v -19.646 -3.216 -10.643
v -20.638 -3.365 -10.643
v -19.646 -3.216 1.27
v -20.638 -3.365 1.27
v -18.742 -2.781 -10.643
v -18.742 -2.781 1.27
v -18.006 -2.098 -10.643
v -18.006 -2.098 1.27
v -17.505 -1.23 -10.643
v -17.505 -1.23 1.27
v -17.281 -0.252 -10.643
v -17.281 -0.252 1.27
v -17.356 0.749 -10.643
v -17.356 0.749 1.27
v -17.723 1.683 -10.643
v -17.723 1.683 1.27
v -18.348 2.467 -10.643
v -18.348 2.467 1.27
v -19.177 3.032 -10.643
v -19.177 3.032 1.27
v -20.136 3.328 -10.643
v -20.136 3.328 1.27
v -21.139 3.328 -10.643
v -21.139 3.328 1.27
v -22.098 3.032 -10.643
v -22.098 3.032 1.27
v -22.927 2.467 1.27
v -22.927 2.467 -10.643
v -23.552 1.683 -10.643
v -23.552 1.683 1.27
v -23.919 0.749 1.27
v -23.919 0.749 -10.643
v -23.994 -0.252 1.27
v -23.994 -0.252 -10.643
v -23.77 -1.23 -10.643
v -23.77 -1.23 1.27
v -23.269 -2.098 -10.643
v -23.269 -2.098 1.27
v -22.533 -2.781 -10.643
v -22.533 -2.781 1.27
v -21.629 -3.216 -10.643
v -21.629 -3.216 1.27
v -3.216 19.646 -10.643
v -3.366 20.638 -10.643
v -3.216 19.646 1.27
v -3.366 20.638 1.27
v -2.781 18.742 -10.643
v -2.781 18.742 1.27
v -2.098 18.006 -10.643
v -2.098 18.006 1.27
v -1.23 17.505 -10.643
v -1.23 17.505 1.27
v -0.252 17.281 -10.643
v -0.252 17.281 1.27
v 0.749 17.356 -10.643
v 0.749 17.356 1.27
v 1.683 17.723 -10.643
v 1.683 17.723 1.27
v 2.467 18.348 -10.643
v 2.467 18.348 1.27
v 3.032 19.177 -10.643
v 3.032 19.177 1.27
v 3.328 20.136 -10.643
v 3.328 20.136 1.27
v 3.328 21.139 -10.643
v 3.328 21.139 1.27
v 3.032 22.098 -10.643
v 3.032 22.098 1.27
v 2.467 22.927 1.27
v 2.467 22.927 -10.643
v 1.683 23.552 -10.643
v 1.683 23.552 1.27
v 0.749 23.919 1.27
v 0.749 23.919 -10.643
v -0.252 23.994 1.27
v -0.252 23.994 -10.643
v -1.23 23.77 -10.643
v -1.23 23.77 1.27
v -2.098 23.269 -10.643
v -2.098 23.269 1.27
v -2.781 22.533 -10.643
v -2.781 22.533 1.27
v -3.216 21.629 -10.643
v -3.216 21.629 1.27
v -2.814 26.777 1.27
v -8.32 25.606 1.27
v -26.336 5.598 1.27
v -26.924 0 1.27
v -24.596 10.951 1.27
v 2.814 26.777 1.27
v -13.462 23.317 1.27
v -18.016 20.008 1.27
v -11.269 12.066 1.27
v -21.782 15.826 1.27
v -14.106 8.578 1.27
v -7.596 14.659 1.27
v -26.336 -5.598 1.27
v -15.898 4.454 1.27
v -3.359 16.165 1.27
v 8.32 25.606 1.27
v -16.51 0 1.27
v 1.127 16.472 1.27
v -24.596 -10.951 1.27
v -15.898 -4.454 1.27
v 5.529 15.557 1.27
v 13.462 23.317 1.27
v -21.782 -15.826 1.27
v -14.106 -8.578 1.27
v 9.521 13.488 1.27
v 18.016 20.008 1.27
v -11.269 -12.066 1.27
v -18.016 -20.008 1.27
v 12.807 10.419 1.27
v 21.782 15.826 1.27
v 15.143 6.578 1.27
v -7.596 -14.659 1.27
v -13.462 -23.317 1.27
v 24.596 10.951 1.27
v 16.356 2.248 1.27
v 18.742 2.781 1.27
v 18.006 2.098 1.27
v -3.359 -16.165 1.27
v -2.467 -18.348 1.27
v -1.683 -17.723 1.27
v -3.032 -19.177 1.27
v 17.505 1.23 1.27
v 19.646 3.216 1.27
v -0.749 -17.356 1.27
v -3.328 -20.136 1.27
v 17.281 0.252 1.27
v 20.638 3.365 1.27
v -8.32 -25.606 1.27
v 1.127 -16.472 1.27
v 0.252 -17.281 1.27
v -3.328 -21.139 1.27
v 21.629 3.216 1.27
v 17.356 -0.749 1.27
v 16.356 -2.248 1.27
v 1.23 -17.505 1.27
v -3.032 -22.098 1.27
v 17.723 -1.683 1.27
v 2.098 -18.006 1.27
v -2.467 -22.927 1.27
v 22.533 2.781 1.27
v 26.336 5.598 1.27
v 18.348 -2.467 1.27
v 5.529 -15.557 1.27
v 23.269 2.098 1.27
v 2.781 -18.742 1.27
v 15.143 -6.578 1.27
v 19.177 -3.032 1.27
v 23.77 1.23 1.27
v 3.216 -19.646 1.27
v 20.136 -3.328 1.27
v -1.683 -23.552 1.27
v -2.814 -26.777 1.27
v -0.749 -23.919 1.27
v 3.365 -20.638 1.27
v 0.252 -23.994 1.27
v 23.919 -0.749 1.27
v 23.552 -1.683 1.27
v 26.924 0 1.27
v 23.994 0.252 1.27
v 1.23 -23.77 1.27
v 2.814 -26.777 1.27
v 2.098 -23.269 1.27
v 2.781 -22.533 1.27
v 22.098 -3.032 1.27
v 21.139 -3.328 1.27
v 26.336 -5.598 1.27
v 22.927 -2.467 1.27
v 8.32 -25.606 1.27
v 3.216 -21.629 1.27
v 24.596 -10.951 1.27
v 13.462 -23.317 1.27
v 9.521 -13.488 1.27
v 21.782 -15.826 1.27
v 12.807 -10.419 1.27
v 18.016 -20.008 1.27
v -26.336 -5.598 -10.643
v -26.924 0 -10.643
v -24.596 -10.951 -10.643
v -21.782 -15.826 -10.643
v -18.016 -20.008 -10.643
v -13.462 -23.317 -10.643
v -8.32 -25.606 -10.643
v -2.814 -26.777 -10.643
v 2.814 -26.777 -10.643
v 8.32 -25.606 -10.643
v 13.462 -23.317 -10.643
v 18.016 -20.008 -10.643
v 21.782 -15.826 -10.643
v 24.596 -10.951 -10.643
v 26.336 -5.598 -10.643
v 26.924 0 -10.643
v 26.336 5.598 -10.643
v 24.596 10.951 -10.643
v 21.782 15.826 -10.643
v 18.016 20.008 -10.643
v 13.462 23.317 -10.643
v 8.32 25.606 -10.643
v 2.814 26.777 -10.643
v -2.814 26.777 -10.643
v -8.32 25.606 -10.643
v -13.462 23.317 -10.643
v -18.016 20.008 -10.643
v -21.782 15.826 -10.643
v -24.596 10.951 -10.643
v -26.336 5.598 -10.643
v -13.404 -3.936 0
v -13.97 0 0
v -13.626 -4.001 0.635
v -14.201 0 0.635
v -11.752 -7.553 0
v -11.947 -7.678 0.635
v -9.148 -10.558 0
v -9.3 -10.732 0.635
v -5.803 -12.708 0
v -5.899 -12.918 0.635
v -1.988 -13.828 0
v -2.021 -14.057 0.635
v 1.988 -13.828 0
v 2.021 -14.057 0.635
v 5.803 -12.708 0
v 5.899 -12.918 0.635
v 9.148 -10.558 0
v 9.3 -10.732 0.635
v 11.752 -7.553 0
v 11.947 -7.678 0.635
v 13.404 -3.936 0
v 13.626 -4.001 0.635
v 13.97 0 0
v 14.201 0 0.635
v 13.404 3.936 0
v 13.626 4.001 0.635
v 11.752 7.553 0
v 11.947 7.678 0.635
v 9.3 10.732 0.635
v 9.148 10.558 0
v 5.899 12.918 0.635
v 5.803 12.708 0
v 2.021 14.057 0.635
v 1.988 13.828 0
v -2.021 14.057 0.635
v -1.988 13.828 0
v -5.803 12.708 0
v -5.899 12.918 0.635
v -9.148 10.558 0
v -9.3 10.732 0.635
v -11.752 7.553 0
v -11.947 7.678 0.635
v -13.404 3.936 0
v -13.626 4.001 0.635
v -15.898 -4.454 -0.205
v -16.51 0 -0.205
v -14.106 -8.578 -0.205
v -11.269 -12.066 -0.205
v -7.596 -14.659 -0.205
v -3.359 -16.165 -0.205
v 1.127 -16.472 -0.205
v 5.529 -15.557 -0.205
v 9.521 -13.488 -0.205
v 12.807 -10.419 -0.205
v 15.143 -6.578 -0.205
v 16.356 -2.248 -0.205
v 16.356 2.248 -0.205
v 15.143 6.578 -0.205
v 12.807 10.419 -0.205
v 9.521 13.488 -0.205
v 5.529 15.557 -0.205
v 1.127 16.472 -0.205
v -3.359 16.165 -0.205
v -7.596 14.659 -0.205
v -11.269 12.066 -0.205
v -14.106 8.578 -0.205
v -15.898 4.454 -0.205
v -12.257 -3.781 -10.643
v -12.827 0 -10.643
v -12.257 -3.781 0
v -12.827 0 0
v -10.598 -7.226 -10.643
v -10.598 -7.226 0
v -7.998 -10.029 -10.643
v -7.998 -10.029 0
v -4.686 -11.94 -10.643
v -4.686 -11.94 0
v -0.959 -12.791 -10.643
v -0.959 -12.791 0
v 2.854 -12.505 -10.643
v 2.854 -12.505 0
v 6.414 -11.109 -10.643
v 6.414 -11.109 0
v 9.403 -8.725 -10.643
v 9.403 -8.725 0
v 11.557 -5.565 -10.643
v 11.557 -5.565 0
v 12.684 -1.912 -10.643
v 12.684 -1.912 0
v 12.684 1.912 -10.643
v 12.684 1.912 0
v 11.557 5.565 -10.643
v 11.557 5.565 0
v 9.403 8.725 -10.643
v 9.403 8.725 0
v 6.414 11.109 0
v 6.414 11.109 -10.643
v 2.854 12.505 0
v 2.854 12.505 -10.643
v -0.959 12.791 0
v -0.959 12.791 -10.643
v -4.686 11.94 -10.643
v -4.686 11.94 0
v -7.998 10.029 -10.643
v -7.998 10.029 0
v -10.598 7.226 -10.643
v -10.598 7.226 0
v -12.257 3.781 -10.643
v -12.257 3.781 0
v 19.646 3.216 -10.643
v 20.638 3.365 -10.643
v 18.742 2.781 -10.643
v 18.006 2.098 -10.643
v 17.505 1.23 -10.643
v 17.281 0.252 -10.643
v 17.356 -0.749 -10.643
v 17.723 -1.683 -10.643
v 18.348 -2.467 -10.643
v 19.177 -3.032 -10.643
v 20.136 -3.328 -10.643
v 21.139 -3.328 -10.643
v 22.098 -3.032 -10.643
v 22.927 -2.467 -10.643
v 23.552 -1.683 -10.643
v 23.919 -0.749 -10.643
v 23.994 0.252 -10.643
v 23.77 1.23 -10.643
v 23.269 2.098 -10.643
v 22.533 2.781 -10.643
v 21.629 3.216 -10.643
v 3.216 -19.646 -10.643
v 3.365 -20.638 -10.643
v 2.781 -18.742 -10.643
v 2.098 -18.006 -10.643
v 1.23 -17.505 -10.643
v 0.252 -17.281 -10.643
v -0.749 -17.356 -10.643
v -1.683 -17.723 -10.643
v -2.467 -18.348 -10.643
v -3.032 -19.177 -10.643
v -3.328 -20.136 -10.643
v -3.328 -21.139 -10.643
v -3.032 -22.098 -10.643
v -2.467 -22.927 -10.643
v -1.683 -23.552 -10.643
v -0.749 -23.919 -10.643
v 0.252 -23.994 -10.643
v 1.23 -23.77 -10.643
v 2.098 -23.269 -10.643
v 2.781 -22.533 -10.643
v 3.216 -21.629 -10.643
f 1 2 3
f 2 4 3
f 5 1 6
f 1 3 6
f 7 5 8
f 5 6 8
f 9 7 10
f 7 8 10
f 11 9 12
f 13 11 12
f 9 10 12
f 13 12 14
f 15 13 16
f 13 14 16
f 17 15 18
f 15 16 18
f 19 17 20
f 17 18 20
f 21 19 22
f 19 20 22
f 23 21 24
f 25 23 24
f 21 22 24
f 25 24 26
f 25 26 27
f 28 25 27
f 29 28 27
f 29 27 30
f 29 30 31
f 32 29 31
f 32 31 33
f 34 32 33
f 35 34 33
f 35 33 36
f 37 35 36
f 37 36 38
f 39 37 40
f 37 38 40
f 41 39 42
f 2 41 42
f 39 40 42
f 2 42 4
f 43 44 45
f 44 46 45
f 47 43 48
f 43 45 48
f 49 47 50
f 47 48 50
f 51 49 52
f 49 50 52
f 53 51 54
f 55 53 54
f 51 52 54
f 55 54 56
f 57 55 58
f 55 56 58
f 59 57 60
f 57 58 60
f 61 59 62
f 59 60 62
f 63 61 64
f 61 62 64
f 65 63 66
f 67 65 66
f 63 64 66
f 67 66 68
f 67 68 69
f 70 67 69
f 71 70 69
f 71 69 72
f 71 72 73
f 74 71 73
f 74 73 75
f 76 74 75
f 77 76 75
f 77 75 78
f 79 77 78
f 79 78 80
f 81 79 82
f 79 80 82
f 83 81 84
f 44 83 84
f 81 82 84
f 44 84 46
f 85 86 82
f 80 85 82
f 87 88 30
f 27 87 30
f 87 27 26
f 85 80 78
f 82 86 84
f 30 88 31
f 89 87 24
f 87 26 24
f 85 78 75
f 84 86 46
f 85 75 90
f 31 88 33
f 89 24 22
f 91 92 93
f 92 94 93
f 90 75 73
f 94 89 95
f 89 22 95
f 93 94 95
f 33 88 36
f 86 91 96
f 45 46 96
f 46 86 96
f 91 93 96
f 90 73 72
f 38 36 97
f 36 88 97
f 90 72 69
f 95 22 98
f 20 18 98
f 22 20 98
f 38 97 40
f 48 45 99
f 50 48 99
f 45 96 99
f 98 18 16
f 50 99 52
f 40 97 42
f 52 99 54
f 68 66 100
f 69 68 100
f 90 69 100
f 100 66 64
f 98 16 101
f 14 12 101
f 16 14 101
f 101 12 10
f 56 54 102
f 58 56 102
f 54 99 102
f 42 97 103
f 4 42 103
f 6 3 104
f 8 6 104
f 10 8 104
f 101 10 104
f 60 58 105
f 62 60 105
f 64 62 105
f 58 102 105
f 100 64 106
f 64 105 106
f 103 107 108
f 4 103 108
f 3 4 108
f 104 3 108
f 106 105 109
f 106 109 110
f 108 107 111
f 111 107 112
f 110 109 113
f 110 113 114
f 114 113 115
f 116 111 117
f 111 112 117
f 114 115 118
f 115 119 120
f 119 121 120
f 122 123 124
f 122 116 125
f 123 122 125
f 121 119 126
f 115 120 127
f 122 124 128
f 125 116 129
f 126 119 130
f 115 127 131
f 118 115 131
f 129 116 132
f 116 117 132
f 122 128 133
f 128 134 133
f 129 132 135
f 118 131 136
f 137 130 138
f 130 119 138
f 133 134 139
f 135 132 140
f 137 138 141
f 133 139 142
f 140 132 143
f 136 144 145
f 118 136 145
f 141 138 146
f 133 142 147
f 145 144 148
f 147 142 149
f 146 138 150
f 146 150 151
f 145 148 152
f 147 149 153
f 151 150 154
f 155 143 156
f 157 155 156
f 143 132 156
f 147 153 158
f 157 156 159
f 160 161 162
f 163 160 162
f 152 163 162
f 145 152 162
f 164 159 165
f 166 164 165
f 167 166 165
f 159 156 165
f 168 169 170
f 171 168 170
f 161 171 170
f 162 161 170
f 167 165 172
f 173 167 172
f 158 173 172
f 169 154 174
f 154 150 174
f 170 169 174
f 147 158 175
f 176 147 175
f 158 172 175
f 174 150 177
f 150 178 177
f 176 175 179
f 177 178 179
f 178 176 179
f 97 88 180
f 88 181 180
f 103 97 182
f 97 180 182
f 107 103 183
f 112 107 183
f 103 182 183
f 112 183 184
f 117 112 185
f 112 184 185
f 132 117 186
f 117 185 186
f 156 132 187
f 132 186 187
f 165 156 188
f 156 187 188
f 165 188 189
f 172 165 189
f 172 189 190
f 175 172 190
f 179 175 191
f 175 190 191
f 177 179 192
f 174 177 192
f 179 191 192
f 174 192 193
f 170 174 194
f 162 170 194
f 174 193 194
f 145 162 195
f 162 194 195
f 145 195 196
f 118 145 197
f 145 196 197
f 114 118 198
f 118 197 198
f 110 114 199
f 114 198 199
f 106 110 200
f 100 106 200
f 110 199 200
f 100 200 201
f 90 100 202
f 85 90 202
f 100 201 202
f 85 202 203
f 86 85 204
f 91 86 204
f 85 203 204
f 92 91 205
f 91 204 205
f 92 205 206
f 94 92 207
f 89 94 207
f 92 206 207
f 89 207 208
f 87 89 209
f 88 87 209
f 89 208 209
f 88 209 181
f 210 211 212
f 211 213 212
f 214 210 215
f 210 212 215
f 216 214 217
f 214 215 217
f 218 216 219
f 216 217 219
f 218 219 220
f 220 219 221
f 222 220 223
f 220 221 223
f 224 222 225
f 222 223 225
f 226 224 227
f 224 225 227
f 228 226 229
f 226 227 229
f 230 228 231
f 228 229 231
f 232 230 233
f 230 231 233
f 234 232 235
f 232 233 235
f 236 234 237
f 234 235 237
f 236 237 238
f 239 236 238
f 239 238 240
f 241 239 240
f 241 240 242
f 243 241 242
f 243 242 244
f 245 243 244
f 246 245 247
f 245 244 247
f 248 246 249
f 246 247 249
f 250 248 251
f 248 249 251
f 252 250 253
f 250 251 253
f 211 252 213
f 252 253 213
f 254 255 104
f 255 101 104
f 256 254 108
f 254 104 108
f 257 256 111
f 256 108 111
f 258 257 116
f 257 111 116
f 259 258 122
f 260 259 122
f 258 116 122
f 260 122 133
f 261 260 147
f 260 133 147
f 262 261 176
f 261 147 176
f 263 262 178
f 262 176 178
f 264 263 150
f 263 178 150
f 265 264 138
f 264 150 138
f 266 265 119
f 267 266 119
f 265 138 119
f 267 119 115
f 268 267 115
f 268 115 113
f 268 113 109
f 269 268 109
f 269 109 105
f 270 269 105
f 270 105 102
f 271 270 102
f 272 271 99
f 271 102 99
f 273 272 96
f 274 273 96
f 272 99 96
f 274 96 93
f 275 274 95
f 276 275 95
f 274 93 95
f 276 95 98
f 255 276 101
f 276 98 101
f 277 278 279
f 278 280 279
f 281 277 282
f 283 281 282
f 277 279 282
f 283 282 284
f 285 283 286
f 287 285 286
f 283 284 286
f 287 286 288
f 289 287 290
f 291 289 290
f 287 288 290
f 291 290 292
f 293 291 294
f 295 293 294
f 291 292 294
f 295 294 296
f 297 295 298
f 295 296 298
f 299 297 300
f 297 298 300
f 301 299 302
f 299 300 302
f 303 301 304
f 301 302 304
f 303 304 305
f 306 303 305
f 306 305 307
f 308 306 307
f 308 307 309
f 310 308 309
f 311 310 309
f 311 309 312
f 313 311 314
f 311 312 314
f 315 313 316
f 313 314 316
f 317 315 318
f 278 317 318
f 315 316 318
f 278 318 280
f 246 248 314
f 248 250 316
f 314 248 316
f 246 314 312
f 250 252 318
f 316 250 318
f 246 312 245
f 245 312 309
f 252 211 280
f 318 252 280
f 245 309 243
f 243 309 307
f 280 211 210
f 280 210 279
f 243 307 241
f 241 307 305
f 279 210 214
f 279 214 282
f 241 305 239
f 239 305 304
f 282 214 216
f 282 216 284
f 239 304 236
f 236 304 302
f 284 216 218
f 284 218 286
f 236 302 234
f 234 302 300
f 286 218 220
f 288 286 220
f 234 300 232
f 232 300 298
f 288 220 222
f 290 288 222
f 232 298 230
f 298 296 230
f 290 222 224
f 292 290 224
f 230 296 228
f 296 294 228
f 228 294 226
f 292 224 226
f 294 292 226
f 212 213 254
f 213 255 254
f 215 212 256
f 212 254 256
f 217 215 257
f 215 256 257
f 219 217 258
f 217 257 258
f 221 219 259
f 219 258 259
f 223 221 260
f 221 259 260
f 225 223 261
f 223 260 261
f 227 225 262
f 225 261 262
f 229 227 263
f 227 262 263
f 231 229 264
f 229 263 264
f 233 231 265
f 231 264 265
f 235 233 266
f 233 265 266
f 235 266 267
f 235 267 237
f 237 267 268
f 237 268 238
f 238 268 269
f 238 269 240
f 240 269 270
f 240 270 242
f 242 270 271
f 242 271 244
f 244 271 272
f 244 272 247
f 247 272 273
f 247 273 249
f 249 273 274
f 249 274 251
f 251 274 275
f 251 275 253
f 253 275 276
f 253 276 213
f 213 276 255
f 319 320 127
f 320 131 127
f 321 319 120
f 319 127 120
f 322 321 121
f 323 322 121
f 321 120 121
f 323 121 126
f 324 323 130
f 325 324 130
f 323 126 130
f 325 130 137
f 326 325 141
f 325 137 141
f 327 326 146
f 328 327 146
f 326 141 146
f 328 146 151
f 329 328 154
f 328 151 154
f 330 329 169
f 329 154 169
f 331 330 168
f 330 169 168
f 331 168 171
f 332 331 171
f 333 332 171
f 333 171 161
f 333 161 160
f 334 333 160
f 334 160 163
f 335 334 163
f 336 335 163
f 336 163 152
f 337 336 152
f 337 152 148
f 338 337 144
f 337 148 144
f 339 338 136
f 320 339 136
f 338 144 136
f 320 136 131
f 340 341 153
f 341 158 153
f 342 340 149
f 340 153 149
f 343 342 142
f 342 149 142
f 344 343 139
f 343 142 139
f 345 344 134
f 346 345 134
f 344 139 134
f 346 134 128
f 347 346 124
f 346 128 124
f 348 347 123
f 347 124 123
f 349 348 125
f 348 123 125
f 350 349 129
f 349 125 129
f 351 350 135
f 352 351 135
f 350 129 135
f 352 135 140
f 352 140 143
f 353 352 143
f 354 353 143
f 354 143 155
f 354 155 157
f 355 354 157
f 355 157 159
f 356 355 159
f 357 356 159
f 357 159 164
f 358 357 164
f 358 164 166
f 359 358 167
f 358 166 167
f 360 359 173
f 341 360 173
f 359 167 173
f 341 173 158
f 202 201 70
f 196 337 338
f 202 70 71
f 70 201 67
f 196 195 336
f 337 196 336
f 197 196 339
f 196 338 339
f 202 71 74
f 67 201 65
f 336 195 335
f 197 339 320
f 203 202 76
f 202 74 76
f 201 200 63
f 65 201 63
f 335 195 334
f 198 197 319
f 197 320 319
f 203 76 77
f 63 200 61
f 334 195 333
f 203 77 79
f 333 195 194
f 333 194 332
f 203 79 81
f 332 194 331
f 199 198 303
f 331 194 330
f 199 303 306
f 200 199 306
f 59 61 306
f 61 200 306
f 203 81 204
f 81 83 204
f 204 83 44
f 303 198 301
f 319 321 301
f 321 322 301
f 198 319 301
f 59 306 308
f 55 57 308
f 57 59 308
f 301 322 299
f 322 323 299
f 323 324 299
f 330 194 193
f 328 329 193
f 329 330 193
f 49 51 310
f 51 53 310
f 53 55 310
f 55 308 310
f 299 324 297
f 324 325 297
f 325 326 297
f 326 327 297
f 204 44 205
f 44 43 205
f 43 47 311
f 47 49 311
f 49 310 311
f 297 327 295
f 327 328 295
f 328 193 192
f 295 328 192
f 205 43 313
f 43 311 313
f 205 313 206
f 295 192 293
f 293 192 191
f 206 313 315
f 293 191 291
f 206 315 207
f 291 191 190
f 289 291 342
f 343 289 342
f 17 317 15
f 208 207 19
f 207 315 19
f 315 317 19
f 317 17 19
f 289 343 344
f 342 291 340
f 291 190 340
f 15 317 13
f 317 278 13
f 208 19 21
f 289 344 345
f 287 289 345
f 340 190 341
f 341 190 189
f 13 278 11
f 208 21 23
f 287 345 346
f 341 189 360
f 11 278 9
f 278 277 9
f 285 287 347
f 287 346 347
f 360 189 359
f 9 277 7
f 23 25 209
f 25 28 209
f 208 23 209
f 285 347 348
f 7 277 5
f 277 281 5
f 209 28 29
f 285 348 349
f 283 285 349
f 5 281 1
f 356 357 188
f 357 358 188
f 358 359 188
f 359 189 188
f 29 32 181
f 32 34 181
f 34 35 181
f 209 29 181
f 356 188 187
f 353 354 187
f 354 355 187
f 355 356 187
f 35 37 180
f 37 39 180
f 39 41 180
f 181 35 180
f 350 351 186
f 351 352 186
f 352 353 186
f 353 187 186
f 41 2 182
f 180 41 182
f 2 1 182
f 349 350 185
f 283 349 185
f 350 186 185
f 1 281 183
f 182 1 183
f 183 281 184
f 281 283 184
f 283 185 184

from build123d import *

# Parameters (mm, degrees)
SKETCH2_R          = 3.3655
CUT_EXTRUDE1_DEPTH = 19.05
CIRPATTERN1_COUNT  = 4


with BuildPart() as part:
    # Sketch1 → Revolve1 (revolve)
    with BuildSketch(Plane(origin=(0, 0, 0), x_dir=(0, 0, -1), z_dir=(1, 0, 0)), mode=Mode.PRIVATE) as revolve1_sk:
        Polygon((-1.27, 26.924), (10.6426, 26.924), (10.6426, 12.827), (0, 12.827), (0, 13.97), (-0.635, 14.201121099), (0.205363195, 16.51), (-1.27, 16.51), align=None)
    revolve(revolve1_sk.sketch.rotate(Axis((0, 0, 0), (0, 0, 1)), 90), axis=Axis((0, 0, 0), (0, 0, 1)))

    # Sketch2 → Cut-Extrude1 (cut, symmetric)
    with BuildSketch(Plane.XY):
        with Locations(Location((0, 20.6375, 0), (0, 0, 180))):
            Circle(SKETCH2_R)
    cut_extrude1 = extrude(amount=CUT_EXTRUDE1_DEPTH, both=True, mode=Mode.SUBTRACT)

    # CirPattern1: Cut-Extrude1 ×4 about axis
    cirpattern1_axis = Axis((0, 0, 0), (0, 0, 1))
    for i in range(1, CIRPATTERN1_COUNT):
        add(cut_extrude1.rotate(cirpattern1_axis, i * 360 / CIRPATTERN1_COUNT), mode=Mode.SUBTRACT)


solid = part.part
